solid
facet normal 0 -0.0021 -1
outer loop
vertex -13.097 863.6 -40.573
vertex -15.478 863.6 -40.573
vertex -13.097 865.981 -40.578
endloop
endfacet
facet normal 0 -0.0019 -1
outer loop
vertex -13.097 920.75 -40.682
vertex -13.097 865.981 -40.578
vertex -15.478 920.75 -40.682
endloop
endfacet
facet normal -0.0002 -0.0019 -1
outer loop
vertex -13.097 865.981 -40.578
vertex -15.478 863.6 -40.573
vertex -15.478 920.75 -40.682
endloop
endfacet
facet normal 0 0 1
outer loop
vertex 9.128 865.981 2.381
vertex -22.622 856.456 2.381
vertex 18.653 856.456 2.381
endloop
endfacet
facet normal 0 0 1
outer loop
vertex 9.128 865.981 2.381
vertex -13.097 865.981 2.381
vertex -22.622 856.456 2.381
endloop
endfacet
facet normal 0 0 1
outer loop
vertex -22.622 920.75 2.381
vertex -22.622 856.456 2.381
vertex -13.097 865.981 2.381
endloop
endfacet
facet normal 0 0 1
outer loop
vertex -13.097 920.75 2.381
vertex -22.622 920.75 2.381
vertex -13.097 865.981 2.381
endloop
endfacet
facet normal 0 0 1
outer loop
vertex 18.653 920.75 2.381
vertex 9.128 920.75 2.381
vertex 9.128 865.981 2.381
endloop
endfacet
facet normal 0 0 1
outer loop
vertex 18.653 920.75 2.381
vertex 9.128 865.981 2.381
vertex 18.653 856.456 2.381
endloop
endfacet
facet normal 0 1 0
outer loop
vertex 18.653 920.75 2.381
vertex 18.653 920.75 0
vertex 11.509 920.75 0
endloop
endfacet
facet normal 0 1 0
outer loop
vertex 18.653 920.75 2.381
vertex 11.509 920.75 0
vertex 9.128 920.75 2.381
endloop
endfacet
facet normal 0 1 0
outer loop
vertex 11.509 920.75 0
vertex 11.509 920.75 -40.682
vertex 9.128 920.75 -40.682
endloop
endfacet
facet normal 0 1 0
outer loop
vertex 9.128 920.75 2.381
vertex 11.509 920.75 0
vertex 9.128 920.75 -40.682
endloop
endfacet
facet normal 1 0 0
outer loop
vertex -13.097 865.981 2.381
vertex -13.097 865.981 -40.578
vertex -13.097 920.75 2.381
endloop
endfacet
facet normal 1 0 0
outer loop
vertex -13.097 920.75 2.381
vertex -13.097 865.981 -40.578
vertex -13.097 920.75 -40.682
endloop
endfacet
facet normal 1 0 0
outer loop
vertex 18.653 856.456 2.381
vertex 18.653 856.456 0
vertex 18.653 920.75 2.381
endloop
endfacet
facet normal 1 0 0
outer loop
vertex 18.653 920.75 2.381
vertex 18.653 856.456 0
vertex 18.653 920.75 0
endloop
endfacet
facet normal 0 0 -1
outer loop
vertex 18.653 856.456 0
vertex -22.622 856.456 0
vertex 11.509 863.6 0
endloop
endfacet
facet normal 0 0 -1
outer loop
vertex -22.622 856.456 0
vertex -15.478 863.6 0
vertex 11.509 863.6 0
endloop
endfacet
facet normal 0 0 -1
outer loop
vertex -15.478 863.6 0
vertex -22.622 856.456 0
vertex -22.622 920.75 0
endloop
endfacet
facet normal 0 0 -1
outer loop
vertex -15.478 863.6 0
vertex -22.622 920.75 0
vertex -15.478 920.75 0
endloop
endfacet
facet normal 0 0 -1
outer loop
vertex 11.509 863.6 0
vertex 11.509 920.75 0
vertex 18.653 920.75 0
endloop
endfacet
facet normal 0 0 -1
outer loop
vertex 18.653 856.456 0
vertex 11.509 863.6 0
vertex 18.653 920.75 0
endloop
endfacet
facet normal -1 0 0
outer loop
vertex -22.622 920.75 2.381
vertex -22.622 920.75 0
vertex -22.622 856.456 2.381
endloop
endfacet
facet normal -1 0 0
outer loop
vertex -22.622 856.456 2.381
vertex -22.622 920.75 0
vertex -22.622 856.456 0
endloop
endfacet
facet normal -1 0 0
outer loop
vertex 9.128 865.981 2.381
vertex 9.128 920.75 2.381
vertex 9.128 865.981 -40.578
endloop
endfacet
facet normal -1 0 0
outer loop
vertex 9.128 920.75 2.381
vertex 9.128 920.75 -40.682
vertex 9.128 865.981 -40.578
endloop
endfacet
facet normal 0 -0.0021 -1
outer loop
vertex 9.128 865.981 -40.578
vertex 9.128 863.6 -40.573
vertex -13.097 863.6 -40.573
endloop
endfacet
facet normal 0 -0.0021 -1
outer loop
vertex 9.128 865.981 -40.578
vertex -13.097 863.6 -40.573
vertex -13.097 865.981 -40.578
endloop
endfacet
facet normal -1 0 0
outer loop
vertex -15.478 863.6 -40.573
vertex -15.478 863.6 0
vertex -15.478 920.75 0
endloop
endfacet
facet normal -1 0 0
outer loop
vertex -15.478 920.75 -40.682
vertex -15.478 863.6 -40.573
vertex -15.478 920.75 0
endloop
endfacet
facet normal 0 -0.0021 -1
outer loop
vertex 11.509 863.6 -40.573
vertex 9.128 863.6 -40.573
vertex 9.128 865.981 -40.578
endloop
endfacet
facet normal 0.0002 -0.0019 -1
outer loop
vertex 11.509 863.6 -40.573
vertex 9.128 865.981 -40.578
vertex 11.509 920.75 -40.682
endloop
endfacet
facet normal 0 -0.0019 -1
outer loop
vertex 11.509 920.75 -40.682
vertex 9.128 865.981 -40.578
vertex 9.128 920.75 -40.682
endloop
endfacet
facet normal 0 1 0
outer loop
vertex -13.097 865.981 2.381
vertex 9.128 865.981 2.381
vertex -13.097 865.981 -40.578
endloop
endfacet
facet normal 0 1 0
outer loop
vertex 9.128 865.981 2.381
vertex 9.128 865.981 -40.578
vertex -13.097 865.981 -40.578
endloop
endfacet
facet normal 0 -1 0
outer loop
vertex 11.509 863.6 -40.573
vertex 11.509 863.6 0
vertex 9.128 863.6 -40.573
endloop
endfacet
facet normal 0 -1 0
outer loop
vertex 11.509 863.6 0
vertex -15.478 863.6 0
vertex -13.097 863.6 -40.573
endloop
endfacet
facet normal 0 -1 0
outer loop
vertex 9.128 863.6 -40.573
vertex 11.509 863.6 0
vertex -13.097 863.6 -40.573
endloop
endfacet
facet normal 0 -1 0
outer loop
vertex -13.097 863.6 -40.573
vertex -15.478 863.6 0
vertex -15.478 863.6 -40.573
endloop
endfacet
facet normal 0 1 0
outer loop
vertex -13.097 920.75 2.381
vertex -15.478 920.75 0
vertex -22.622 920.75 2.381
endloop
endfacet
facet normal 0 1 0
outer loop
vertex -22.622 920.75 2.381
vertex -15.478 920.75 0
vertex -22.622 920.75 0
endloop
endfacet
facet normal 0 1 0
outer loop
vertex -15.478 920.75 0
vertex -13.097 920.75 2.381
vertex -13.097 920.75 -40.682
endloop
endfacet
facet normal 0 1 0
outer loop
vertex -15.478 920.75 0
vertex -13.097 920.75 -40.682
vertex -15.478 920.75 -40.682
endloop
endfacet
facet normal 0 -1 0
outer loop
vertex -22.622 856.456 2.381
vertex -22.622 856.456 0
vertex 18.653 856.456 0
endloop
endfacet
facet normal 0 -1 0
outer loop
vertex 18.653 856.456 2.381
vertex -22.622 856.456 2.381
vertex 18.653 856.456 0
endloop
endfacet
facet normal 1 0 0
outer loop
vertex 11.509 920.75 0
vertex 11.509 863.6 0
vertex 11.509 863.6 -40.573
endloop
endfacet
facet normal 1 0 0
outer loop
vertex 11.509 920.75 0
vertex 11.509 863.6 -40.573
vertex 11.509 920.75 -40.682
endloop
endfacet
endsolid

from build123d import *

# Parameters (mm, degrees)
EXTRUDE1_START   = -15.478468141
EXTRUDE1_DEPTH   = 2.38125
EXTRUDE1_START_2 = 9.127781859
EXTRUDE1_2_DEPTH = 2.38125
EXTRUDE1_START_3 = -13.097218141
EXTRUDE1_3_DEPTH = 22.225
EXTRUDE2_DEPTH   = 2.38125


# Read off the part's stored shape, not the designer's step: Extrude1
with BuildPart() as part:
    # Extrude1 outline → Extrude1 (new body)
    with BuildSketch(Plane.YZ.offset(EXTRUDE1_START)):
        Polygon((863.6, 0), (863.6, -40.573158736), (920.75, -40.682134014), (920.75, 0), align=None)
    extrude(amount=EXTRUDE1_DEPTH)



with BuildPart() as body_2:
    # Extrude1 2 outline → Extrude1 2 (new body)
    with BuildSketch(Plane.YZ.offset(EXTRUDE1_START_2)):
        Polygon((863.6, 0), (863.6, -40.573158736), (920.75, -40.682134014), (920.75, 0), align=None)
    extrude(amount=EXTRUDE1_2_DEPTH)


with BuildPart() as part_1:
    add(part.part)

    add(body_2.part)  # Extrude1 3 merges body 2
    # Extrude1 3 outline → Extrude1 3 (add)
    with BuildSketch(Plane.YZ.offset(EXTRUDE1_START_3)):
        Polygon((865.98125, 0), (863.6, 0), (863.6, -40.573158736), (865.98125, -40.577699373), align=None)
    extrude(amount=EXTRUDE1_3_DEPTH)

    # Sketch2 → Extrude2 (add)
    with BuildSketch(Plane.XY):
        Polygon((18.652781859, 920.75), (9.127781859, 920.75), (9.127781859, 865.98125), (-13.097218141, 865.98125), (-13.097218141, 920.75), (-22.622218141, 920.75), (-22.622218141, 856.45625), (18.652781859, 856.45625), align=None)
    extrude(amount=EXTRUDE2_DEPTH)


solid = part_1.part
